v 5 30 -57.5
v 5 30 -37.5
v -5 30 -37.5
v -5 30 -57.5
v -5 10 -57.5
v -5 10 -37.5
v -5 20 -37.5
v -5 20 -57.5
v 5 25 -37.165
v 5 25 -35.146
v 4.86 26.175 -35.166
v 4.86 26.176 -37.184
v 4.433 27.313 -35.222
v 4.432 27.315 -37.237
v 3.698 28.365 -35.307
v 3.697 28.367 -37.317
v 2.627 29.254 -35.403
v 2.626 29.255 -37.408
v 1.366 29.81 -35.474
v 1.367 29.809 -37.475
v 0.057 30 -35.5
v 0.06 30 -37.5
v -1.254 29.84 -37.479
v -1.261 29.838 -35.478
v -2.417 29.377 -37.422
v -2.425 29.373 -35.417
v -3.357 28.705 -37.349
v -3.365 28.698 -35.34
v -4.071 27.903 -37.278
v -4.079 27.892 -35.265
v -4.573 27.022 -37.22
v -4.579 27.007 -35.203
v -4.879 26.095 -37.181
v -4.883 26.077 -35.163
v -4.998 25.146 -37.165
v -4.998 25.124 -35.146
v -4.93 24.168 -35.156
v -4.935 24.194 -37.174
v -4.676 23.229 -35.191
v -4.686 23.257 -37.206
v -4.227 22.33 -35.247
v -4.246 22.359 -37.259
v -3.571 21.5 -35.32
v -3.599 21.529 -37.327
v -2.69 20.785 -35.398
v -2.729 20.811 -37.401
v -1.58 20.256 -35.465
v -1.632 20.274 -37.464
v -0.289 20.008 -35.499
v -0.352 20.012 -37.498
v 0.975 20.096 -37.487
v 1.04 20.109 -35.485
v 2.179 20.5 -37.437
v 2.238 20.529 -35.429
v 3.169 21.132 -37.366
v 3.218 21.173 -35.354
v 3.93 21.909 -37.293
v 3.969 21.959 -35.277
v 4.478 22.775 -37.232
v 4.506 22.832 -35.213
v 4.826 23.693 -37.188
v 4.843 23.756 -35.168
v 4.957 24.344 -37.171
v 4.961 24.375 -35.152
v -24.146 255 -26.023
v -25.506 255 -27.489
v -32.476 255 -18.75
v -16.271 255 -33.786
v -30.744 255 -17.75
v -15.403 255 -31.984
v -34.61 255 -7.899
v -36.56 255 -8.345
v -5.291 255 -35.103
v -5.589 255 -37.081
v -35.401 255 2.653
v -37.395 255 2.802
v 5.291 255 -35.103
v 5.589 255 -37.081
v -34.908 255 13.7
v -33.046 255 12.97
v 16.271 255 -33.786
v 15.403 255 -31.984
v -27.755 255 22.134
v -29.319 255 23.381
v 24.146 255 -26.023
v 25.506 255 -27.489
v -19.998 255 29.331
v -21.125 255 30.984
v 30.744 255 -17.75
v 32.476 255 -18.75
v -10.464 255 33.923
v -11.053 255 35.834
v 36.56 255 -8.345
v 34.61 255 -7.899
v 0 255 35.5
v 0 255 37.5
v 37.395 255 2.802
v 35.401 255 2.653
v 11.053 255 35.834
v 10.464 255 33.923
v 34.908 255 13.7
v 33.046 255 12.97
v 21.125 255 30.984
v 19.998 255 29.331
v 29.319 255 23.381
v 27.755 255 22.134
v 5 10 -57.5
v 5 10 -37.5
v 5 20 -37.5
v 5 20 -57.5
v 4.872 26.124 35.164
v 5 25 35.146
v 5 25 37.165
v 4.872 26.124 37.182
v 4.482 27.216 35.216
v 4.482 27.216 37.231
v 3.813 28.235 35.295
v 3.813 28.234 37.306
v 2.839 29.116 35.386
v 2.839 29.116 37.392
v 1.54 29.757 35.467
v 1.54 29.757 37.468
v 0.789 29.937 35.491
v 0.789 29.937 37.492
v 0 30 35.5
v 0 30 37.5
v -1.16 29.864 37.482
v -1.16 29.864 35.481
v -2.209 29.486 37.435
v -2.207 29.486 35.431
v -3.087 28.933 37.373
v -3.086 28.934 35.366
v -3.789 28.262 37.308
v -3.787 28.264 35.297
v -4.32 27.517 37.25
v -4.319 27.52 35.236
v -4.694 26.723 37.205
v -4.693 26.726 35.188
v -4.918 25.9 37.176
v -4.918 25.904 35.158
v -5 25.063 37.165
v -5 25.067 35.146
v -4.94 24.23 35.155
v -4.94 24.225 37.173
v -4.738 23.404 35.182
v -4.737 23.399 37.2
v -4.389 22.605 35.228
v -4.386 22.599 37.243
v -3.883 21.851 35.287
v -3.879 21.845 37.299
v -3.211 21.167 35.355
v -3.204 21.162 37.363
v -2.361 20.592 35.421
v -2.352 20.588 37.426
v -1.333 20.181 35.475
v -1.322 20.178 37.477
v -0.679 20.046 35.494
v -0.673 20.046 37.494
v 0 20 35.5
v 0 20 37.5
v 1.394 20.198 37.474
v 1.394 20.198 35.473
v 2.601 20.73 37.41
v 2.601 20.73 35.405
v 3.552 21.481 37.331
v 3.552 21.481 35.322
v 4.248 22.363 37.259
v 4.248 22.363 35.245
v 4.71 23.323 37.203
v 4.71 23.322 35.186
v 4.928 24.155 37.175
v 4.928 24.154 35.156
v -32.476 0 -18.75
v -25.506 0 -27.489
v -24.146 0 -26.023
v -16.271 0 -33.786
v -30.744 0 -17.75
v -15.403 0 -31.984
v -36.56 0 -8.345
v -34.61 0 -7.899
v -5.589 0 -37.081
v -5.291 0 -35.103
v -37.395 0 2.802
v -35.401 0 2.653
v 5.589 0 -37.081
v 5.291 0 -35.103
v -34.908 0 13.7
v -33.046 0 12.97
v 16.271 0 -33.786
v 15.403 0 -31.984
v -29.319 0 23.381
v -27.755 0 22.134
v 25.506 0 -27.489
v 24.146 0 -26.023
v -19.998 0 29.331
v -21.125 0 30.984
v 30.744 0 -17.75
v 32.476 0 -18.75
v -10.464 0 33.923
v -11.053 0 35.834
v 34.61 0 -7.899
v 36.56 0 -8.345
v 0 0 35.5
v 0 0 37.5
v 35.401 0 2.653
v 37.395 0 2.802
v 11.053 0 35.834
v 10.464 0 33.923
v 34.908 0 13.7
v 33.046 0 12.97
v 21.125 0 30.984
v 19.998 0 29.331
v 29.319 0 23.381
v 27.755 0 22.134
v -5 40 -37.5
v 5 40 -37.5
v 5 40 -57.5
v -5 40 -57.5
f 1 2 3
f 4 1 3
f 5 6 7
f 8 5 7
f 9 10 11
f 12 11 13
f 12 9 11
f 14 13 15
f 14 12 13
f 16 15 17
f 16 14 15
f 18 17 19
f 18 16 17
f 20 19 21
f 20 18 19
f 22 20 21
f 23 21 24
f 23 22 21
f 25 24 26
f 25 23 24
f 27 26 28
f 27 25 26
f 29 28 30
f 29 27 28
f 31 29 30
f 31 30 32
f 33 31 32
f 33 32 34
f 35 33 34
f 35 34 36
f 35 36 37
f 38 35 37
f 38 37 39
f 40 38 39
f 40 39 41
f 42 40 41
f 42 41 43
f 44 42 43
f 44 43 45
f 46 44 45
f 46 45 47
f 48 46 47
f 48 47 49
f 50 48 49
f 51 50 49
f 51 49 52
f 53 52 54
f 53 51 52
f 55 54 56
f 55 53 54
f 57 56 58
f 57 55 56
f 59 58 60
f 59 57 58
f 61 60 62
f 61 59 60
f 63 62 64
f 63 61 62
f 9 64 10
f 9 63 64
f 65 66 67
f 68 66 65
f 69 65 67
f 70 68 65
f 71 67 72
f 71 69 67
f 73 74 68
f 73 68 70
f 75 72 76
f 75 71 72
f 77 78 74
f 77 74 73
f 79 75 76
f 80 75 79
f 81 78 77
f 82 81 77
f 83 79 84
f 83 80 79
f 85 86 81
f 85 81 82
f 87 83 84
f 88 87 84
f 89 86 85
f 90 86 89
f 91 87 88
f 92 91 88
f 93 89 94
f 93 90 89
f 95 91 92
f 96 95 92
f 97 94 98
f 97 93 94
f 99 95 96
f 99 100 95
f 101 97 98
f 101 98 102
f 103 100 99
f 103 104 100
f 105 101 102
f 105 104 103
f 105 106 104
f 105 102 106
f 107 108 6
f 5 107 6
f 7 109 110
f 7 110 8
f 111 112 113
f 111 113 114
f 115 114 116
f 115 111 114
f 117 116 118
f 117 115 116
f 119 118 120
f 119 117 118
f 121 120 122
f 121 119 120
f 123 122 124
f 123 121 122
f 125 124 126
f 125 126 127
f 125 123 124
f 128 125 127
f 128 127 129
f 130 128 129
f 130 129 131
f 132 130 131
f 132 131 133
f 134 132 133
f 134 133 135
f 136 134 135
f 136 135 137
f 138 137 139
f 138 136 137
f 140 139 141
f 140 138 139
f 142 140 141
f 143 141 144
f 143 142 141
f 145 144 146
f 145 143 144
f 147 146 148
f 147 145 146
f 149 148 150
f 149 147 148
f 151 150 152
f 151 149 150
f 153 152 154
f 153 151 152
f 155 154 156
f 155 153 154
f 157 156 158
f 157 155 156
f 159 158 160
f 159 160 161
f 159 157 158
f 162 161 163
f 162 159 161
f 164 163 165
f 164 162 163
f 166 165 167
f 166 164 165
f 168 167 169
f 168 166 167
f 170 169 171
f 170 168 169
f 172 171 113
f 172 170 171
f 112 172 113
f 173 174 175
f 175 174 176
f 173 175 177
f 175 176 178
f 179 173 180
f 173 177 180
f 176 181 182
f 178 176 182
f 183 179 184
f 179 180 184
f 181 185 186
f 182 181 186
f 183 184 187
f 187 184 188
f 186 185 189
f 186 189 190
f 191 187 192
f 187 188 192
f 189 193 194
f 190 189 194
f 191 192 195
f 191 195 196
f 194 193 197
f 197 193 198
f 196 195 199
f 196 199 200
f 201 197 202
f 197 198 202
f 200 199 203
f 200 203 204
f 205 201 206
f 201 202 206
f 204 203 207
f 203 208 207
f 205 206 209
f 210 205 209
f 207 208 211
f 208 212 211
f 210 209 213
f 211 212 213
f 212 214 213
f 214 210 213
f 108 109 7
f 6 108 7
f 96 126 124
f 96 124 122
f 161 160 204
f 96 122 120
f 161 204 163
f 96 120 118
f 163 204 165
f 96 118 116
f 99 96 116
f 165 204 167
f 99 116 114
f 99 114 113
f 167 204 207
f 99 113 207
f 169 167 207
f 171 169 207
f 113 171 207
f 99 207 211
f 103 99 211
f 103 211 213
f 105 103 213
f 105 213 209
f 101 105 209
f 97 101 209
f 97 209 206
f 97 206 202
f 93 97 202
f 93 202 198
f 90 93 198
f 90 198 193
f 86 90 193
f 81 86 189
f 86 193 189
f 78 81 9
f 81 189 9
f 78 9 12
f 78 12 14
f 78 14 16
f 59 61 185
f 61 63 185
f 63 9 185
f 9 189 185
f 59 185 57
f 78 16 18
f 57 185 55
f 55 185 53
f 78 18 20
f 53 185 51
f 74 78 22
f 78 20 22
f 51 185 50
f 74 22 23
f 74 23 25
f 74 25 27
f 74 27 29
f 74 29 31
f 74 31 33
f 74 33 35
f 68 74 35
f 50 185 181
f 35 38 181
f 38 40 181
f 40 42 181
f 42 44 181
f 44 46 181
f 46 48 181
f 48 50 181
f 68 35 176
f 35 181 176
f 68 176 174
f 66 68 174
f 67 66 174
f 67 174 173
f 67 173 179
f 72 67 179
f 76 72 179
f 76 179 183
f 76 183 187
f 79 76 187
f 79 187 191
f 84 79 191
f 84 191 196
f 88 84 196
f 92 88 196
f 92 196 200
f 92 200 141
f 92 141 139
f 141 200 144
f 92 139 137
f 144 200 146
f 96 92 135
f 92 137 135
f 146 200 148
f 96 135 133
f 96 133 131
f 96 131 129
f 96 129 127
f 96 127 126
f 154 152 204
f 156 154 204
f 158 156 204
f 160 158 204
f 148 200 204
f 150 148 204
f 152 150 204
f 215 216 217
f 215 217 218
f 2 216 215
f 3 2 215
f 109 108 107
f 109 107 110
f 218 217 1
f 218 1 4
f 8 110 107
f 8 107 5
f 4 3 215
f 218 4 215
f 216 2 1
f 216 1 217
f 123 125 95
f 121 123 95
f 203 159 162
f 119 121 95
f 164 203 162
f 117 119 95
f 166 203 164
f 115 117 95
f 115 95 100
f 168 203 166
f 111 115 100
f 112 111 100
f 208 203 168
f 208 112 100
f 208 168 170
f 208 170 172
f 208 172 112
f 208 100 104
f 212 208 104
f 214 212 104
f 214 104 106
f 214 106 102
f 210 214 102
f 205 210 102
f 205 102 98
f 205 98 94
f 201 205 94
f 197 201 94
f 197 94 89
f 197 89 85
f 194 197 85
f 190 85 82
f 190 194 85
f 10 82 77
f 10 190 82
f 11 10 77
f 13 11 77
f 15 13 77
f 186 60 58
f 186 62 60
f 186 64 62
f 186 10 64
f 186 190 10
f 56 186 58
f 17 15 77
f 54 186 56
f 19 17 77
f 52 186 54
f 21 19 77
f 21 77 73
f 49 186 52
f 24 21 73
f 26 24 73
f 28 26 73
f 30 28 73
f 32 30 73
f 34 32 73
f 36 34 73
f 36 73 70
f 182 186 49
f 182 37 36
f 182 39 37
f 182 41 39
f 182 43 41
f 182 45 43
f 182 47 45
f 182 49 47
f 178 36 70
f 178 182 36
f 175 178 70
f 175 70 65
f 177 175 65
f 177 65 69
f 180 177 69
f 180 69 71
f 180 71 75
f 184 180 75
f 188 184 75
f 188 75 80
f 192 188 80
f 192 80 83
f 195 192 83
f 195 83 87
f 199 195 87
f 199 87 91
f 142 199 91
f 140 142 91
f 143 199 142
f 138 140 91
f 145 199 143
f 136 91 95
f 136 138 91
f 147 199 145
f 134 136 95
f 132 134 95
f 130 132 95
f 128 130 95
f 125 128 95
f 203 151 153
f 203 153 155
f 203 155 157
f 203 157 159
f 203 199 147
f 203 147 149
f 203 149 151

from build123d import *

# Parameters (mm, degrees)
SKETCH1_R               = 37.5
SKETCH1_R_2             = 35.5
BOSS_EXTRUDE1_DEPTH     = 255
CUT_EXTRUDE1_DEPTH      = 261.456330313
CUT_EXTRUDE1_DEPTH_BACK = 261.456330313
SKETCH2_R               = 5
SKETCH3_W               = 10
SKETCH3_H               = 10
BOSS_EXTRUDE2_DEPTH     = 20
BOSS_EXTRUDE2_2_DEPTH   = 20


with BuildPart() as part:
    # Sketch1 → Boss-Extrude1 (new body)
    with BuildSketch(Plane(origin=(0, 0, 0), x_dir=(1, 0, 0), z_dir=(0, 1, 0))):
        with Locations(Location((0, 0, 0), (0, 0, 270))):
            Circle(SKETCH1_R)
        with Locations(Location((0, 0, 0), (0, 0, 270))):
            Circle(SKETCH1_R_2, mode=Mode.SUBTRACT)
    extrude(amount=BOSS_EXTRUDE1_DEPTH)

    # Sketch2 → Cut-Extrude1 (cut, two sides: drawn at the far end of the back side and taken through both)
    with BuildSketch(Plane.XY.offset(-CUT_EXTRUDE1_DEPTH_BACK)):
        with Locations((0, 25)):
            Circle(SKETCH2_R)
    extrude(amount=CUT_EXTRUDE1_DEPTH + CUT_EXTRUDE1_DEPTH_BACK, mode=Mode.SUBTRACT)


with BuildPart() as body_2:
    # Sketch3 → Boss-Extrude2 (new body)
    with BuildSketch(Plane(origin=(0, 0, -37.5), x_dir=(-1, 0, 0), z_dir=(0, 0, -1))):
        with Locations((0, 35)):
            Rectangle(SKETCH3_W, SKETCH3_H)
    extrude(amount=BOSS_EXTRUDE2_DEPTH)


with BuildPart() as body_3:
    # Sketch3 → Boss-Extrude2 2 (new body)
    with BuildSketch(Plane(origin=(0, 0, -37.5), x_dir=(-1, 0, 0), z_dir=(0, 0, -1))):
        with Locations((0, 15)):
            Rectangle(SKETCH3_W, SKETCH3_H)
    extrude(amount=BOSS_EXTRUDE2_2_DEPTH)


solid = Compound([part.part, body_2.part, body_3.part])
